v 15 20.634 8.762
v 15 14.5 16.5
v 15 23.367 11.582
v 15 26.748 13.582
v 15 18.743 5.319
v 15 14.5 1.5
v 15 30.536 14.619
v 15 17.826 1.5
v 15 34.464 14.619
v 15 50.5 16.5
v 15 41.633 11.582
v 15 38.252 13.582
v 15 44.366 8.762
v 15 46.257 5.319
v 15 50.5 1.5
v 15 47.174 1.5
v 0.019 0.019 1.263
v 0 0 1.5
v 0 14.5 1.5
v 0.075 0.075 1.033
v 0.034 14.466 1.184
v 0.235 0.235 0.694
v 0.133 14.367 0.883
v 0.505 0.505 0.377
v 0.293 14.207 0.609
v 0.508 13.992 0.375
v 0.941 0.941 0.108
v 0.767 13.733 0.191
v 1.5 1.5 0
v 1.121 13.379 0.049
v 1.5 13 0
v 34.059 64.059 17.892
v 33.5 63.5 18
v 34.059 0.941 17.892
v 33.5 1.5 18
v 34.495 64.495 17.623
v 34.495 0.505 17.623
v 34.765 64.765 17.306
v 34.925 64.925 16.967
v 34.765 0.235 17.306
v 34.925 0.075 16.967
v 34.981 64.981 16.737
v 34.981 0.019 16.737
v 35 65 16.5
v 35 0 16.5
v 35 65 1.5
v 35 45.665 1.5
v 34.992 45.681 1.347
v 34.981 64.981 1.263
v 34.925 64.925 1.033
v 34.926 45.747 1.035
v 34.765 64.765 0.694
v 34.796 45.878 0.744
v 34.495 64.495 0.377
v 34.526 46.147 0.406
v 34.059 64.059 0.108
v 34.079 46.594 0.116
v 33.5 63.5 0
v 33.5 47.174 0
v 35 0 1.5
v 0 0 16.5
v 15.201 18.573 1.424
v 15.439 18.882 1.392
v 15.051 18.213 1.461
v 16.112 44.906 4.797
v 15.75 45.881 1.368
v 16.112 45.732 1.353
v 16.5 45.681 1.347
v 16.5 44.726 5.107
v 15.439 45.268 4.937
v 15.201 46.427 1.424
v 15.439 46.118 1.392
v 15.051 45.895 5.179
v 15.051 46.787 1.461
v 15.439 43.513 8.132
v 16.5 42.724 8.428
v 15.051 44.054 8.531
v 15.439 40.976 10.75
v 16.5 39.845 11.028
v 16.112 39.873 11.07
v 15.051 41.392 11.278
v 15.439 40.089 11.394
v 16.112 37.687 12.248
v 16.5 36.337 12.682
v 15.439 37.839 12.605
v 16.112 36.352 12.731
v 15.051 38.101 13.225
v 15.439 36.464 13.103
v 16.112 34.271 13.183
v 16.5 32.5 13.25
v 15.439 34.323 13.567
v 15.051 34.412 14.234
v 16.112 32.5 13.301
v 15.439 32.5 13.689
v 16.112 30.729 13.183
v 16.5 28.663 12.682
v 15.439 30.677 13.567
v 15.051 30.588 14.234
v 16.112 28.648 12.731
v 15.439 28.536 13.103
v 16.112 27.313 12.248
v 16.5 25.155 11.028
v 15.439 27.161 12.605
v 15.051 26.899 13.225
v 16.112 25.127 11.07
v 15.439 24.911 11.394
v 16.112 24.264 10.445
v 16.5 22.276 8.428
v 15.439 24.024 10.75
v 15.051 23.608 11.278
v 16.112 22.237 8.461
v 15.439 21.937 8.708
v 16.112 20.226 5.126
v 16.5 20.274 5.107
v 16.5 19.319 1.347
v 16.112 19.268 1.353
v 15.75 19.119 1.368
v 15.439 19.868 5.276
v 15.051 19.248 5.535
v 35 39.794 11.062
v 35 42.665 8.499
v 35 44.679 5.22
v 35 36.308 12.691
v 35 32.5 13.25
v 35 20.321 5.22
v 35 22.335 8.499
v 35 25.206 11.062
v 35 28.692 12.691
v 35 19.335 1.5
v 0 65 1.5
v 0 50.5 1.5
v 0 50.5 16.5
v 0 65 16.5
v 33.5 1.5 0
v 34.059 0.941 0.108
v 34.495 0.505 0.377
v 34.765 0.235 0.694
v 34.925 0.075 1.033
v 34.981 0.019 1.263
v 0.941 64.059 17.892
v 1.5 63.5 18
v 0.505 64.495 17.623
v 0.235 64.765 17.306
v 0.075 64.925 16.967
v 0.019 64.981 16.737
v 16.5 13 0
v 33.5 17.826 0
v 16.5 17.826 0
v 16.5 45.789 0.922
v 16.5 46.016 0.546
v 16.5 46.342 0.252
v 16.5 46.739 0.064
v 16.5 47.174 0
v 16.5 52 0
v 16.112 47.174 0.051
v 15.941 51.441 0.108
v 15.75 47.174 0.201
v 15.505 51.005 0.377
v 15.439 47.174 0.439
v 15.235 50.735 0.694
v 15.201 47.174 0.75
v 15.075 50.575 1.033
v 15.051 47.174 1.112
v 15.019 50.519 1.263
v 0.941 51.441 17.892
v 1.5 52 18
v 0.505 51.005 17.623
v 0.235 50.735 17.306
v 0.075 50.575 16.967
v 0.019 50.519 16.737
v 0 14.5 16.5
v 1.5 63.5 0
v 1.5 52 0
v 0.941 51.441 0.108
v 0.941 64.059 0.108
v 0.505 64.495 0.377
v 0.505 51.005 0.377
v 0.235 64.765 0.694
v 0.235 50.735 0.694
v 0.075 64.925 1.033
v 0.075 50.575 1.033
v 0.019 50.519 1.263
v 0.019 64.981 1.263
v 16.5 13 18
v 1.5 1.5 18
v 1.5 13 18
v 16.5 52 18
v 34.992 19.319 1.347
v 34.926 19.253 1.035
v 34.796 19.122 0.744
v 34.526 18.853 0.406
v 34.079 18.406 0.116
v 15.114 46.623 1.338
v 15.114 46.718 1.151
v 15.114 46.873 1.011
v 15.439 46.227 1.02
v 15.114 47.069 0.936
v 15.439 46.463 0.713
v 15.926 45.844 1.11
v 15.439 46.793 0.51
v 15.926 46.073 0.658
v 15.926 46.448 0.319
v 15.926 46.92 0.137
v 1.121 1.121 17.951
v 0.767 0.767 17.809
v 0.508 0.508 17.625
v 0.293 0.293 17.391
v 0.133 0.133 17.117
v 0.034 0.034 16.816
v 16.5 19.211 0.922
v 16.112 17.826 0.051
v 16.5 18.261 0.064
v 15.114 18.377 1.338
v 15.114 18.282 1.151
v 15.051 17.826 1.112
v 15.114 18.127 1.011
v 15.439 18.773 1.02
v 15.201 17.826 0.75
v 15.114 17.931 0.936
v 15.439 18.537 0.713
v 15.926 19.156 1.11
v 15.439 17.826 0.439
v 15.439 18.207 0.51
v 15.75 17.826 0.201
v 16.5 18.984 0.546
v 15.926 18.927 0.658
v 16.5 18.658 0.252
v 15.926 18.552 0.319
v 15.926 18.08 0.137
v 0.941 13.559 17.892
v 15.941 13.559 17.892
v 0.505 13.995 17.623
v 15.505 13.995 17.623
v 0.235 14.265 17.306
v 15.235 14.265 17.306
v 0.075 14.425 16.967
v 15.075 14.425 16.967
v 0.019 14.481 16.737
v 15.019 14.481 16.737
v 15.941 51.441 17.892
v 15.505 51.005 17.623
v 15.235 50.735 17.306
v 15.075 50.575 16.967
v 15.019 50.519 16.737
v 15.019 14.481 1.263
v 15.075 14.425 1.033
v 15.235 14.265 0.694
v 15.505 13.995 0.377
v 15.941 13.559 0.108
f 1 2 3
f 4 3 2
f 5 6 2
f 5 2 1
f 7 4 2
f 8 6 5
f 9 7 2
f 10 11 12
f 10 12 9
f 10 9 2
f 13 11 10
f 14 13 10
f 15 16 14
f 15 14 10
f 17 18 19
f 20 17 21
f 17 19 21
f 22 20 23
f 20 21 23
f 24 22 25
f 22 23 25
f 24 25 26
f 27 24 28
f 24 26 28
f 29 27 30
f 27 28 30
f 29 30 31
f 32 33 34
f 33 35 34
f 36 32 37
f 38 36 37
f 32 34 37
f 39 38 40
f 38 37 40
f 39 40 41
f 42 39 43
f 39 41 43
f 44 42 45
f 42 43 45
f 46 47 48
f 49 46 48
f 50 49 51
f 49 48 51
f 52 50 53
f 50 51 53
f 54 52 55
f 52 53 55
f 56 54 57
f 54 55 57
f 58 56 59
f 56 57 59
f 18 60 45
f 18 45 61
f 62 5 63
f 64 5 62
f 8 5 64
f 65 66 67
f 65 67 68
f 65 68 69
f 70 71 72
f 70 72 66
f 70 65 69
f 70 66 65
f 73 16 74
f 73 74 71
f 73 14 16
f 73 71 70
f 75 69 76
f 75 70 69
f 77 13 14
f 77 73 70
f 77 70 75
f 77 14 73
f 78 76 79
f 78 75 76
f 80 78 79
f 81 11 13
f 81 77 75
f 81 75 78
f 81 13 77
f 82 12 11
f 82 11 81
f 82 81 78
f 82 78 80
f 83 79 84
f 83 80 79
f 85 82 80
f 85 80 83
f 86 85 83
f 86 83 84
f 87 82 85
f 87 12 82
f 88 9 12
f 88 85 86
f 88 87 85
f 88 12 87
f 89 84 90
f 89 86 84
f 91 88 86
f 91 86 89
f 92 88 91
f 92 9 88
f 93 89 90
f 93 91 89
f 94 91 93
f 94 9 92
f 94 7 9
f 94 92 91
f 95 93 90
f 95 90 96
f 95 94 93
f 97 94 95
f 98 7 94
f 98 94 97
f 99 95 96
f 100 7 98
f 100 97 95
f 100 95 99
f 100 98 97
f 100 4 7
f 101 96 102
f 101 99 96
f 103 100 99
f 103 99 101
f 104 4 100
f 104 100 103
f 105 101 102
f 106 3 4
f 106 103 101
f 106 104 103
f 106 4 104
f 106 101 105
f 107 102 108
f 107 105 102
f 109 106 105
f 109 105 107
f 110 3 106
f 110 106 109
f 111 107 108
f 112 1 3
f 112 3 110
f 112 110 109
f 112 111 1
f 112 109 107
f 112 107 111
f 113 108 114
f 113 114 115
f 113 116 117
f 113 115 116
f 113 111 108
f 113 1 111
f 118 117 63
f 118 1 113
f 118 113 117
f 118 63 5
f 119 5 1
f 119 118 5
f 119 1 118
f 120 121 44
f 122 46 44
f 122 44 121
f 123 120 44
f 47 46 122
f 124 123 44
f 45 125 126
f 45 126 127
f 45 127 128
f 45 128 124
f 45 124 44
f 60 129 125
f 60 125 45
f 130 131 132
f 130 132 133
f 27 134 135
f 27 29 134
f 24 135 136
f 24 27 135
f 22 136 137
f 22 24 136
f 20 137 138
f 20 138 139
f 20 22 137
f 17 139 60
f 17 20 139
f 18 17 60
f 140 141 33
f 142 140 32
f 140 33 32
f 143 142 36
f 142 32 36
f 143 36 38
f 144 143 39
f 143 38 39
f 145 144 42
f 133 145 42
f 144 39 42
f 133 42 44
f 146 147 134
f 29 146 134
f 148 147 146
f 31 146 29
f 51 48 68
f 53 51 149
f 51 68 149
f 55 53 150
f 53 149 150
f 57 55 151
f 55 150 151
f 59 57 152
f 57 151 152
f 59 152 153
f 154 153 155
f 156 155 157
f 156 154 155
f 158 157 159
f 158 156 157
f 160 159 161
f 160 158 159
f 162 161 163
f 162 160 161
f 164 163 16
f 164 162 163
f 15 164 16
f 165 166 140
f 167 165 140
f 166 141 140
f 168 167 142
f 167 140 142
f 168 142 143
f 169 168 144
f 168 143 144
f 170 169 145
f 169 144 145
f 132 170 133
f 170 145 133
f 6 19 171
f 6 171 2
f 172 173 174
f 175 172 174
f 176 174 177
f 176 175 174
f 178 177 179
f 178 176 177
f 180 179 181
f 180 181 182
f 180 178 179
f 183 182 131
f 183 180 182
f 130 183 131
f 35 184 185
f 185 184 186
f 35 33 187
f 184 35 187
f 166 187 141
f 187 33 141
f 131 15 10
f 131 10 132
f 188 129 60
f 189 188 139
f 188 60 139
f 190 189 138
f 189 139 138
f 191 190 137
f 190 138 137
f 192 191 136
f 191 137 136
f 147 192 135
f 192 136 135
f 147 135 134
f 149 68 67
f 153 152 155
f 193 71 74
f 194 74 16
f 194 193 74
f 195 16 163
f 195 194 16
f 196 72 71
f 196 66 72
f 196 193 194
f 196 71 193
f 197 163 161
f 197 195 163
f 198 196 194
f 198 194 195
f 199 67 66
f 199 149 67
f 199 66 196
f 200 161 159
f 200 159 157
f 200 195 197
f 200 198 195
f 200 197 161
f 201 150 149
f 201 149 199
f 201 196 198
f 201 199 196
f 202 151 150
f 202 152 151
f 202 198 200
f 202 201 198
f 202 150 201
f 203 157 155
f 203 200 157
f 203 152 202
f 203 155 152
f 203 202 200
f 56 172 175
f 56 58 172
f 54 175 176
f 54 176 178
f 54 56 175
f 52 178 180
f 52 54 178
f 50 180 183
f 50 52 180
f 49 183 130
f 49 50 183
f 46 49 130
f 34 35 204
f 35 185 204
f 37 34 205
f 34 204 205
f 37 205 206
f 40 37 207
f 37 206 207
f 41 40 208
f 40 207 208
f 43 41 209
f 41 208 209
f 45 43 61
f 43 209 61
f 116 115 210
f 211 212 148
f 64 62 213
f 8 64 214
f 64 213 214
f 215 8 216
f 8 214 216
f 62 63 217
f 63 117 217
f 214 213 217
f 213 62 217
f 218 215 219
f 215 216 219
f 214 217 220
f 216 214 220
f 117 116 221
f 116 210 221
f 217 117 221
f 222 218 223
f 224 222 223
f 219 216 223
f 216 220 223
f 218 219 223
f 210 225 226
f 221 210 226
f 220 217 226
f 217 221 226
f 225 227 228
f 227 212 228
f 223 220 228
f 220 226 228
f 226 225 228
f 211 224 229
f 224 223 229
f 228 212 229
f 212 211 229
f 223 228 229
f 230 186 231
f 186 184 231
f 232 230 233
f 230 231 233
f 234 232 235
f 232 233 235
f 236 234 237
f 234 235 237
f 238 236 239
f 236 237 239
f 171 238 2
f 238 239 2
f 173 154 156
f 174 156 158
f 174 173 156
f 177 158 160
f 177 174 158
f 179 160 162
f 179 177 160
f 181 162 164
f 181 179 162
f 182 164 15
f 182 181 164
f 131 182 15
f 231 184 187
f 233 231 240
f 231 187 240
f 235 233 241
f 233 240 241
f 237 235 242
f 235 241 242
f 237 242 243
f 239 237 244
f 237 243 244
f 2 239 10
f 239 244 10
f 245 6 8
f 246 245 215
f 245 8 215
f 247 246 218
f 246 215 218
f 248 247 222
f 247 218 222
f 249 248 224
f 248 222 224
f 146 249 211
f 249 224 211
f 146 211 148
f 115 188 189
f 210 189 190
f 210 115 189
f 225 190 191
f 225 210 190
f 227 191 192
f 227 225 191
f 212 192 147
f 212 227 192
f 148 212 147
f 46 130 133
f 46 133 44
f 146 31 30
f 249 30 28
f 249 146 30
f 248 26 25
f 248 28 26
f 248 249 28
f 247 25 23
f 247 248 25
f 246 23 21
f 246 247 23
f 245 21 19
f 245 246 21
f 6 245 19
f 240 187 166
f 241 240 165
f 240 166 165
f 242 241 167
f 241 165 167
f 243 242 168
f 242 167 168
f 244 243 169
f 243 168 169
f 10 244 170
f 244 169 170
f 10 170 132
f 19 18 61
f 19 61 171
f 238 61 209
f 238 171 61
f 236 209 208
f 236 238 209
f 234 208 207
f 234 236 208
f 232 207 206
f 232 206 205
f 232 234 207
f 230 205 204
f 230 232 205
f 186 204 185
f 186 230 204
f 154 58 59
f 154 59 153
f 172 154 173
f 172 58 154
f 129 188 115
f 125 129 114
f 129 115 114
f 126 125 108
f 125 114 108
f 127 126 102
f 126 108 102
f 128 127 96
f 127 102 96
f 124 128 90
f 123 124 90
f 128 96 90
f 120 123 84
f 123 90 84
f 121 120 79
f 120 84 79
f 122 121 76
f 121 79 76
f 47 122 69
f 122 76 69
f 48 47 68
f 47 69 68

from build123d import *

# Parameters (mm, degrees)
EXTRUDE_1_DEPTH     = 18
SKETCH_2_R          = 13.25
CUT_EXTRUDE_1_DEPTH = 76.986840966
FILLET_1_R          = 1.5


with BuildPart() as part:
    # ｽｹｯﾁ1 → ﾎﾞｽ - 押し出し1 (new body)
    with BuildSketch(Plane.XY):
        Polygon((0, 0), (0, 14.5), (15, 14.5), (15, 50.5), (0, 50.5), (0, 65), (35, 65), (35, 0), align=None)
    extrude(amount=EXTRUDE_1_DEPTH)

    # ｽｹｯﾁ2 → ｶｯﾄ - 押し出し1 (cut, through all)
    with BuildSketch(Plane.ZY):
        with Locations((0, 32.5)):
            Circle(SKETCH_2_R)
    extrude(amount=-CUT_EXTRUDE_1_DEPTH, mode=Mode.SUBTRACT)

    # ﾌｨﾚｯﾄ1
    fillet_1_edges = [part.edges().sort_by_distance(p)[0] for p in [
        (0, 57.75, 0),
        (17.5, 65, 0),
        (7.5, 14.5, 18),
        (35, 55.375, 0),
        (17.5, 0, 0),
        (0, 7.25, 0),
        (7.5, 14.5, 0),
        (15, 16.875, 0),
        (0, 7.25, 18),
        (17.5, 0, 18),
        (35, 32.5, 18),
        (15, 48.125, 0),
        (35, 9.625, 0),
        (25, 19.25, 0),
        (25, 45.75, 0),
        (17.5, 65, 18),
        (15, 32.5, 13.25),
        (0, 57.75, 18),
        (7.5, 50.5, 18),
        (15, 32.5, 18),
        (7.5, 50.5, 0),
    ]]
    fillet(fillet_1_edges, radius=FILLET_1_R)


solid = part.part
